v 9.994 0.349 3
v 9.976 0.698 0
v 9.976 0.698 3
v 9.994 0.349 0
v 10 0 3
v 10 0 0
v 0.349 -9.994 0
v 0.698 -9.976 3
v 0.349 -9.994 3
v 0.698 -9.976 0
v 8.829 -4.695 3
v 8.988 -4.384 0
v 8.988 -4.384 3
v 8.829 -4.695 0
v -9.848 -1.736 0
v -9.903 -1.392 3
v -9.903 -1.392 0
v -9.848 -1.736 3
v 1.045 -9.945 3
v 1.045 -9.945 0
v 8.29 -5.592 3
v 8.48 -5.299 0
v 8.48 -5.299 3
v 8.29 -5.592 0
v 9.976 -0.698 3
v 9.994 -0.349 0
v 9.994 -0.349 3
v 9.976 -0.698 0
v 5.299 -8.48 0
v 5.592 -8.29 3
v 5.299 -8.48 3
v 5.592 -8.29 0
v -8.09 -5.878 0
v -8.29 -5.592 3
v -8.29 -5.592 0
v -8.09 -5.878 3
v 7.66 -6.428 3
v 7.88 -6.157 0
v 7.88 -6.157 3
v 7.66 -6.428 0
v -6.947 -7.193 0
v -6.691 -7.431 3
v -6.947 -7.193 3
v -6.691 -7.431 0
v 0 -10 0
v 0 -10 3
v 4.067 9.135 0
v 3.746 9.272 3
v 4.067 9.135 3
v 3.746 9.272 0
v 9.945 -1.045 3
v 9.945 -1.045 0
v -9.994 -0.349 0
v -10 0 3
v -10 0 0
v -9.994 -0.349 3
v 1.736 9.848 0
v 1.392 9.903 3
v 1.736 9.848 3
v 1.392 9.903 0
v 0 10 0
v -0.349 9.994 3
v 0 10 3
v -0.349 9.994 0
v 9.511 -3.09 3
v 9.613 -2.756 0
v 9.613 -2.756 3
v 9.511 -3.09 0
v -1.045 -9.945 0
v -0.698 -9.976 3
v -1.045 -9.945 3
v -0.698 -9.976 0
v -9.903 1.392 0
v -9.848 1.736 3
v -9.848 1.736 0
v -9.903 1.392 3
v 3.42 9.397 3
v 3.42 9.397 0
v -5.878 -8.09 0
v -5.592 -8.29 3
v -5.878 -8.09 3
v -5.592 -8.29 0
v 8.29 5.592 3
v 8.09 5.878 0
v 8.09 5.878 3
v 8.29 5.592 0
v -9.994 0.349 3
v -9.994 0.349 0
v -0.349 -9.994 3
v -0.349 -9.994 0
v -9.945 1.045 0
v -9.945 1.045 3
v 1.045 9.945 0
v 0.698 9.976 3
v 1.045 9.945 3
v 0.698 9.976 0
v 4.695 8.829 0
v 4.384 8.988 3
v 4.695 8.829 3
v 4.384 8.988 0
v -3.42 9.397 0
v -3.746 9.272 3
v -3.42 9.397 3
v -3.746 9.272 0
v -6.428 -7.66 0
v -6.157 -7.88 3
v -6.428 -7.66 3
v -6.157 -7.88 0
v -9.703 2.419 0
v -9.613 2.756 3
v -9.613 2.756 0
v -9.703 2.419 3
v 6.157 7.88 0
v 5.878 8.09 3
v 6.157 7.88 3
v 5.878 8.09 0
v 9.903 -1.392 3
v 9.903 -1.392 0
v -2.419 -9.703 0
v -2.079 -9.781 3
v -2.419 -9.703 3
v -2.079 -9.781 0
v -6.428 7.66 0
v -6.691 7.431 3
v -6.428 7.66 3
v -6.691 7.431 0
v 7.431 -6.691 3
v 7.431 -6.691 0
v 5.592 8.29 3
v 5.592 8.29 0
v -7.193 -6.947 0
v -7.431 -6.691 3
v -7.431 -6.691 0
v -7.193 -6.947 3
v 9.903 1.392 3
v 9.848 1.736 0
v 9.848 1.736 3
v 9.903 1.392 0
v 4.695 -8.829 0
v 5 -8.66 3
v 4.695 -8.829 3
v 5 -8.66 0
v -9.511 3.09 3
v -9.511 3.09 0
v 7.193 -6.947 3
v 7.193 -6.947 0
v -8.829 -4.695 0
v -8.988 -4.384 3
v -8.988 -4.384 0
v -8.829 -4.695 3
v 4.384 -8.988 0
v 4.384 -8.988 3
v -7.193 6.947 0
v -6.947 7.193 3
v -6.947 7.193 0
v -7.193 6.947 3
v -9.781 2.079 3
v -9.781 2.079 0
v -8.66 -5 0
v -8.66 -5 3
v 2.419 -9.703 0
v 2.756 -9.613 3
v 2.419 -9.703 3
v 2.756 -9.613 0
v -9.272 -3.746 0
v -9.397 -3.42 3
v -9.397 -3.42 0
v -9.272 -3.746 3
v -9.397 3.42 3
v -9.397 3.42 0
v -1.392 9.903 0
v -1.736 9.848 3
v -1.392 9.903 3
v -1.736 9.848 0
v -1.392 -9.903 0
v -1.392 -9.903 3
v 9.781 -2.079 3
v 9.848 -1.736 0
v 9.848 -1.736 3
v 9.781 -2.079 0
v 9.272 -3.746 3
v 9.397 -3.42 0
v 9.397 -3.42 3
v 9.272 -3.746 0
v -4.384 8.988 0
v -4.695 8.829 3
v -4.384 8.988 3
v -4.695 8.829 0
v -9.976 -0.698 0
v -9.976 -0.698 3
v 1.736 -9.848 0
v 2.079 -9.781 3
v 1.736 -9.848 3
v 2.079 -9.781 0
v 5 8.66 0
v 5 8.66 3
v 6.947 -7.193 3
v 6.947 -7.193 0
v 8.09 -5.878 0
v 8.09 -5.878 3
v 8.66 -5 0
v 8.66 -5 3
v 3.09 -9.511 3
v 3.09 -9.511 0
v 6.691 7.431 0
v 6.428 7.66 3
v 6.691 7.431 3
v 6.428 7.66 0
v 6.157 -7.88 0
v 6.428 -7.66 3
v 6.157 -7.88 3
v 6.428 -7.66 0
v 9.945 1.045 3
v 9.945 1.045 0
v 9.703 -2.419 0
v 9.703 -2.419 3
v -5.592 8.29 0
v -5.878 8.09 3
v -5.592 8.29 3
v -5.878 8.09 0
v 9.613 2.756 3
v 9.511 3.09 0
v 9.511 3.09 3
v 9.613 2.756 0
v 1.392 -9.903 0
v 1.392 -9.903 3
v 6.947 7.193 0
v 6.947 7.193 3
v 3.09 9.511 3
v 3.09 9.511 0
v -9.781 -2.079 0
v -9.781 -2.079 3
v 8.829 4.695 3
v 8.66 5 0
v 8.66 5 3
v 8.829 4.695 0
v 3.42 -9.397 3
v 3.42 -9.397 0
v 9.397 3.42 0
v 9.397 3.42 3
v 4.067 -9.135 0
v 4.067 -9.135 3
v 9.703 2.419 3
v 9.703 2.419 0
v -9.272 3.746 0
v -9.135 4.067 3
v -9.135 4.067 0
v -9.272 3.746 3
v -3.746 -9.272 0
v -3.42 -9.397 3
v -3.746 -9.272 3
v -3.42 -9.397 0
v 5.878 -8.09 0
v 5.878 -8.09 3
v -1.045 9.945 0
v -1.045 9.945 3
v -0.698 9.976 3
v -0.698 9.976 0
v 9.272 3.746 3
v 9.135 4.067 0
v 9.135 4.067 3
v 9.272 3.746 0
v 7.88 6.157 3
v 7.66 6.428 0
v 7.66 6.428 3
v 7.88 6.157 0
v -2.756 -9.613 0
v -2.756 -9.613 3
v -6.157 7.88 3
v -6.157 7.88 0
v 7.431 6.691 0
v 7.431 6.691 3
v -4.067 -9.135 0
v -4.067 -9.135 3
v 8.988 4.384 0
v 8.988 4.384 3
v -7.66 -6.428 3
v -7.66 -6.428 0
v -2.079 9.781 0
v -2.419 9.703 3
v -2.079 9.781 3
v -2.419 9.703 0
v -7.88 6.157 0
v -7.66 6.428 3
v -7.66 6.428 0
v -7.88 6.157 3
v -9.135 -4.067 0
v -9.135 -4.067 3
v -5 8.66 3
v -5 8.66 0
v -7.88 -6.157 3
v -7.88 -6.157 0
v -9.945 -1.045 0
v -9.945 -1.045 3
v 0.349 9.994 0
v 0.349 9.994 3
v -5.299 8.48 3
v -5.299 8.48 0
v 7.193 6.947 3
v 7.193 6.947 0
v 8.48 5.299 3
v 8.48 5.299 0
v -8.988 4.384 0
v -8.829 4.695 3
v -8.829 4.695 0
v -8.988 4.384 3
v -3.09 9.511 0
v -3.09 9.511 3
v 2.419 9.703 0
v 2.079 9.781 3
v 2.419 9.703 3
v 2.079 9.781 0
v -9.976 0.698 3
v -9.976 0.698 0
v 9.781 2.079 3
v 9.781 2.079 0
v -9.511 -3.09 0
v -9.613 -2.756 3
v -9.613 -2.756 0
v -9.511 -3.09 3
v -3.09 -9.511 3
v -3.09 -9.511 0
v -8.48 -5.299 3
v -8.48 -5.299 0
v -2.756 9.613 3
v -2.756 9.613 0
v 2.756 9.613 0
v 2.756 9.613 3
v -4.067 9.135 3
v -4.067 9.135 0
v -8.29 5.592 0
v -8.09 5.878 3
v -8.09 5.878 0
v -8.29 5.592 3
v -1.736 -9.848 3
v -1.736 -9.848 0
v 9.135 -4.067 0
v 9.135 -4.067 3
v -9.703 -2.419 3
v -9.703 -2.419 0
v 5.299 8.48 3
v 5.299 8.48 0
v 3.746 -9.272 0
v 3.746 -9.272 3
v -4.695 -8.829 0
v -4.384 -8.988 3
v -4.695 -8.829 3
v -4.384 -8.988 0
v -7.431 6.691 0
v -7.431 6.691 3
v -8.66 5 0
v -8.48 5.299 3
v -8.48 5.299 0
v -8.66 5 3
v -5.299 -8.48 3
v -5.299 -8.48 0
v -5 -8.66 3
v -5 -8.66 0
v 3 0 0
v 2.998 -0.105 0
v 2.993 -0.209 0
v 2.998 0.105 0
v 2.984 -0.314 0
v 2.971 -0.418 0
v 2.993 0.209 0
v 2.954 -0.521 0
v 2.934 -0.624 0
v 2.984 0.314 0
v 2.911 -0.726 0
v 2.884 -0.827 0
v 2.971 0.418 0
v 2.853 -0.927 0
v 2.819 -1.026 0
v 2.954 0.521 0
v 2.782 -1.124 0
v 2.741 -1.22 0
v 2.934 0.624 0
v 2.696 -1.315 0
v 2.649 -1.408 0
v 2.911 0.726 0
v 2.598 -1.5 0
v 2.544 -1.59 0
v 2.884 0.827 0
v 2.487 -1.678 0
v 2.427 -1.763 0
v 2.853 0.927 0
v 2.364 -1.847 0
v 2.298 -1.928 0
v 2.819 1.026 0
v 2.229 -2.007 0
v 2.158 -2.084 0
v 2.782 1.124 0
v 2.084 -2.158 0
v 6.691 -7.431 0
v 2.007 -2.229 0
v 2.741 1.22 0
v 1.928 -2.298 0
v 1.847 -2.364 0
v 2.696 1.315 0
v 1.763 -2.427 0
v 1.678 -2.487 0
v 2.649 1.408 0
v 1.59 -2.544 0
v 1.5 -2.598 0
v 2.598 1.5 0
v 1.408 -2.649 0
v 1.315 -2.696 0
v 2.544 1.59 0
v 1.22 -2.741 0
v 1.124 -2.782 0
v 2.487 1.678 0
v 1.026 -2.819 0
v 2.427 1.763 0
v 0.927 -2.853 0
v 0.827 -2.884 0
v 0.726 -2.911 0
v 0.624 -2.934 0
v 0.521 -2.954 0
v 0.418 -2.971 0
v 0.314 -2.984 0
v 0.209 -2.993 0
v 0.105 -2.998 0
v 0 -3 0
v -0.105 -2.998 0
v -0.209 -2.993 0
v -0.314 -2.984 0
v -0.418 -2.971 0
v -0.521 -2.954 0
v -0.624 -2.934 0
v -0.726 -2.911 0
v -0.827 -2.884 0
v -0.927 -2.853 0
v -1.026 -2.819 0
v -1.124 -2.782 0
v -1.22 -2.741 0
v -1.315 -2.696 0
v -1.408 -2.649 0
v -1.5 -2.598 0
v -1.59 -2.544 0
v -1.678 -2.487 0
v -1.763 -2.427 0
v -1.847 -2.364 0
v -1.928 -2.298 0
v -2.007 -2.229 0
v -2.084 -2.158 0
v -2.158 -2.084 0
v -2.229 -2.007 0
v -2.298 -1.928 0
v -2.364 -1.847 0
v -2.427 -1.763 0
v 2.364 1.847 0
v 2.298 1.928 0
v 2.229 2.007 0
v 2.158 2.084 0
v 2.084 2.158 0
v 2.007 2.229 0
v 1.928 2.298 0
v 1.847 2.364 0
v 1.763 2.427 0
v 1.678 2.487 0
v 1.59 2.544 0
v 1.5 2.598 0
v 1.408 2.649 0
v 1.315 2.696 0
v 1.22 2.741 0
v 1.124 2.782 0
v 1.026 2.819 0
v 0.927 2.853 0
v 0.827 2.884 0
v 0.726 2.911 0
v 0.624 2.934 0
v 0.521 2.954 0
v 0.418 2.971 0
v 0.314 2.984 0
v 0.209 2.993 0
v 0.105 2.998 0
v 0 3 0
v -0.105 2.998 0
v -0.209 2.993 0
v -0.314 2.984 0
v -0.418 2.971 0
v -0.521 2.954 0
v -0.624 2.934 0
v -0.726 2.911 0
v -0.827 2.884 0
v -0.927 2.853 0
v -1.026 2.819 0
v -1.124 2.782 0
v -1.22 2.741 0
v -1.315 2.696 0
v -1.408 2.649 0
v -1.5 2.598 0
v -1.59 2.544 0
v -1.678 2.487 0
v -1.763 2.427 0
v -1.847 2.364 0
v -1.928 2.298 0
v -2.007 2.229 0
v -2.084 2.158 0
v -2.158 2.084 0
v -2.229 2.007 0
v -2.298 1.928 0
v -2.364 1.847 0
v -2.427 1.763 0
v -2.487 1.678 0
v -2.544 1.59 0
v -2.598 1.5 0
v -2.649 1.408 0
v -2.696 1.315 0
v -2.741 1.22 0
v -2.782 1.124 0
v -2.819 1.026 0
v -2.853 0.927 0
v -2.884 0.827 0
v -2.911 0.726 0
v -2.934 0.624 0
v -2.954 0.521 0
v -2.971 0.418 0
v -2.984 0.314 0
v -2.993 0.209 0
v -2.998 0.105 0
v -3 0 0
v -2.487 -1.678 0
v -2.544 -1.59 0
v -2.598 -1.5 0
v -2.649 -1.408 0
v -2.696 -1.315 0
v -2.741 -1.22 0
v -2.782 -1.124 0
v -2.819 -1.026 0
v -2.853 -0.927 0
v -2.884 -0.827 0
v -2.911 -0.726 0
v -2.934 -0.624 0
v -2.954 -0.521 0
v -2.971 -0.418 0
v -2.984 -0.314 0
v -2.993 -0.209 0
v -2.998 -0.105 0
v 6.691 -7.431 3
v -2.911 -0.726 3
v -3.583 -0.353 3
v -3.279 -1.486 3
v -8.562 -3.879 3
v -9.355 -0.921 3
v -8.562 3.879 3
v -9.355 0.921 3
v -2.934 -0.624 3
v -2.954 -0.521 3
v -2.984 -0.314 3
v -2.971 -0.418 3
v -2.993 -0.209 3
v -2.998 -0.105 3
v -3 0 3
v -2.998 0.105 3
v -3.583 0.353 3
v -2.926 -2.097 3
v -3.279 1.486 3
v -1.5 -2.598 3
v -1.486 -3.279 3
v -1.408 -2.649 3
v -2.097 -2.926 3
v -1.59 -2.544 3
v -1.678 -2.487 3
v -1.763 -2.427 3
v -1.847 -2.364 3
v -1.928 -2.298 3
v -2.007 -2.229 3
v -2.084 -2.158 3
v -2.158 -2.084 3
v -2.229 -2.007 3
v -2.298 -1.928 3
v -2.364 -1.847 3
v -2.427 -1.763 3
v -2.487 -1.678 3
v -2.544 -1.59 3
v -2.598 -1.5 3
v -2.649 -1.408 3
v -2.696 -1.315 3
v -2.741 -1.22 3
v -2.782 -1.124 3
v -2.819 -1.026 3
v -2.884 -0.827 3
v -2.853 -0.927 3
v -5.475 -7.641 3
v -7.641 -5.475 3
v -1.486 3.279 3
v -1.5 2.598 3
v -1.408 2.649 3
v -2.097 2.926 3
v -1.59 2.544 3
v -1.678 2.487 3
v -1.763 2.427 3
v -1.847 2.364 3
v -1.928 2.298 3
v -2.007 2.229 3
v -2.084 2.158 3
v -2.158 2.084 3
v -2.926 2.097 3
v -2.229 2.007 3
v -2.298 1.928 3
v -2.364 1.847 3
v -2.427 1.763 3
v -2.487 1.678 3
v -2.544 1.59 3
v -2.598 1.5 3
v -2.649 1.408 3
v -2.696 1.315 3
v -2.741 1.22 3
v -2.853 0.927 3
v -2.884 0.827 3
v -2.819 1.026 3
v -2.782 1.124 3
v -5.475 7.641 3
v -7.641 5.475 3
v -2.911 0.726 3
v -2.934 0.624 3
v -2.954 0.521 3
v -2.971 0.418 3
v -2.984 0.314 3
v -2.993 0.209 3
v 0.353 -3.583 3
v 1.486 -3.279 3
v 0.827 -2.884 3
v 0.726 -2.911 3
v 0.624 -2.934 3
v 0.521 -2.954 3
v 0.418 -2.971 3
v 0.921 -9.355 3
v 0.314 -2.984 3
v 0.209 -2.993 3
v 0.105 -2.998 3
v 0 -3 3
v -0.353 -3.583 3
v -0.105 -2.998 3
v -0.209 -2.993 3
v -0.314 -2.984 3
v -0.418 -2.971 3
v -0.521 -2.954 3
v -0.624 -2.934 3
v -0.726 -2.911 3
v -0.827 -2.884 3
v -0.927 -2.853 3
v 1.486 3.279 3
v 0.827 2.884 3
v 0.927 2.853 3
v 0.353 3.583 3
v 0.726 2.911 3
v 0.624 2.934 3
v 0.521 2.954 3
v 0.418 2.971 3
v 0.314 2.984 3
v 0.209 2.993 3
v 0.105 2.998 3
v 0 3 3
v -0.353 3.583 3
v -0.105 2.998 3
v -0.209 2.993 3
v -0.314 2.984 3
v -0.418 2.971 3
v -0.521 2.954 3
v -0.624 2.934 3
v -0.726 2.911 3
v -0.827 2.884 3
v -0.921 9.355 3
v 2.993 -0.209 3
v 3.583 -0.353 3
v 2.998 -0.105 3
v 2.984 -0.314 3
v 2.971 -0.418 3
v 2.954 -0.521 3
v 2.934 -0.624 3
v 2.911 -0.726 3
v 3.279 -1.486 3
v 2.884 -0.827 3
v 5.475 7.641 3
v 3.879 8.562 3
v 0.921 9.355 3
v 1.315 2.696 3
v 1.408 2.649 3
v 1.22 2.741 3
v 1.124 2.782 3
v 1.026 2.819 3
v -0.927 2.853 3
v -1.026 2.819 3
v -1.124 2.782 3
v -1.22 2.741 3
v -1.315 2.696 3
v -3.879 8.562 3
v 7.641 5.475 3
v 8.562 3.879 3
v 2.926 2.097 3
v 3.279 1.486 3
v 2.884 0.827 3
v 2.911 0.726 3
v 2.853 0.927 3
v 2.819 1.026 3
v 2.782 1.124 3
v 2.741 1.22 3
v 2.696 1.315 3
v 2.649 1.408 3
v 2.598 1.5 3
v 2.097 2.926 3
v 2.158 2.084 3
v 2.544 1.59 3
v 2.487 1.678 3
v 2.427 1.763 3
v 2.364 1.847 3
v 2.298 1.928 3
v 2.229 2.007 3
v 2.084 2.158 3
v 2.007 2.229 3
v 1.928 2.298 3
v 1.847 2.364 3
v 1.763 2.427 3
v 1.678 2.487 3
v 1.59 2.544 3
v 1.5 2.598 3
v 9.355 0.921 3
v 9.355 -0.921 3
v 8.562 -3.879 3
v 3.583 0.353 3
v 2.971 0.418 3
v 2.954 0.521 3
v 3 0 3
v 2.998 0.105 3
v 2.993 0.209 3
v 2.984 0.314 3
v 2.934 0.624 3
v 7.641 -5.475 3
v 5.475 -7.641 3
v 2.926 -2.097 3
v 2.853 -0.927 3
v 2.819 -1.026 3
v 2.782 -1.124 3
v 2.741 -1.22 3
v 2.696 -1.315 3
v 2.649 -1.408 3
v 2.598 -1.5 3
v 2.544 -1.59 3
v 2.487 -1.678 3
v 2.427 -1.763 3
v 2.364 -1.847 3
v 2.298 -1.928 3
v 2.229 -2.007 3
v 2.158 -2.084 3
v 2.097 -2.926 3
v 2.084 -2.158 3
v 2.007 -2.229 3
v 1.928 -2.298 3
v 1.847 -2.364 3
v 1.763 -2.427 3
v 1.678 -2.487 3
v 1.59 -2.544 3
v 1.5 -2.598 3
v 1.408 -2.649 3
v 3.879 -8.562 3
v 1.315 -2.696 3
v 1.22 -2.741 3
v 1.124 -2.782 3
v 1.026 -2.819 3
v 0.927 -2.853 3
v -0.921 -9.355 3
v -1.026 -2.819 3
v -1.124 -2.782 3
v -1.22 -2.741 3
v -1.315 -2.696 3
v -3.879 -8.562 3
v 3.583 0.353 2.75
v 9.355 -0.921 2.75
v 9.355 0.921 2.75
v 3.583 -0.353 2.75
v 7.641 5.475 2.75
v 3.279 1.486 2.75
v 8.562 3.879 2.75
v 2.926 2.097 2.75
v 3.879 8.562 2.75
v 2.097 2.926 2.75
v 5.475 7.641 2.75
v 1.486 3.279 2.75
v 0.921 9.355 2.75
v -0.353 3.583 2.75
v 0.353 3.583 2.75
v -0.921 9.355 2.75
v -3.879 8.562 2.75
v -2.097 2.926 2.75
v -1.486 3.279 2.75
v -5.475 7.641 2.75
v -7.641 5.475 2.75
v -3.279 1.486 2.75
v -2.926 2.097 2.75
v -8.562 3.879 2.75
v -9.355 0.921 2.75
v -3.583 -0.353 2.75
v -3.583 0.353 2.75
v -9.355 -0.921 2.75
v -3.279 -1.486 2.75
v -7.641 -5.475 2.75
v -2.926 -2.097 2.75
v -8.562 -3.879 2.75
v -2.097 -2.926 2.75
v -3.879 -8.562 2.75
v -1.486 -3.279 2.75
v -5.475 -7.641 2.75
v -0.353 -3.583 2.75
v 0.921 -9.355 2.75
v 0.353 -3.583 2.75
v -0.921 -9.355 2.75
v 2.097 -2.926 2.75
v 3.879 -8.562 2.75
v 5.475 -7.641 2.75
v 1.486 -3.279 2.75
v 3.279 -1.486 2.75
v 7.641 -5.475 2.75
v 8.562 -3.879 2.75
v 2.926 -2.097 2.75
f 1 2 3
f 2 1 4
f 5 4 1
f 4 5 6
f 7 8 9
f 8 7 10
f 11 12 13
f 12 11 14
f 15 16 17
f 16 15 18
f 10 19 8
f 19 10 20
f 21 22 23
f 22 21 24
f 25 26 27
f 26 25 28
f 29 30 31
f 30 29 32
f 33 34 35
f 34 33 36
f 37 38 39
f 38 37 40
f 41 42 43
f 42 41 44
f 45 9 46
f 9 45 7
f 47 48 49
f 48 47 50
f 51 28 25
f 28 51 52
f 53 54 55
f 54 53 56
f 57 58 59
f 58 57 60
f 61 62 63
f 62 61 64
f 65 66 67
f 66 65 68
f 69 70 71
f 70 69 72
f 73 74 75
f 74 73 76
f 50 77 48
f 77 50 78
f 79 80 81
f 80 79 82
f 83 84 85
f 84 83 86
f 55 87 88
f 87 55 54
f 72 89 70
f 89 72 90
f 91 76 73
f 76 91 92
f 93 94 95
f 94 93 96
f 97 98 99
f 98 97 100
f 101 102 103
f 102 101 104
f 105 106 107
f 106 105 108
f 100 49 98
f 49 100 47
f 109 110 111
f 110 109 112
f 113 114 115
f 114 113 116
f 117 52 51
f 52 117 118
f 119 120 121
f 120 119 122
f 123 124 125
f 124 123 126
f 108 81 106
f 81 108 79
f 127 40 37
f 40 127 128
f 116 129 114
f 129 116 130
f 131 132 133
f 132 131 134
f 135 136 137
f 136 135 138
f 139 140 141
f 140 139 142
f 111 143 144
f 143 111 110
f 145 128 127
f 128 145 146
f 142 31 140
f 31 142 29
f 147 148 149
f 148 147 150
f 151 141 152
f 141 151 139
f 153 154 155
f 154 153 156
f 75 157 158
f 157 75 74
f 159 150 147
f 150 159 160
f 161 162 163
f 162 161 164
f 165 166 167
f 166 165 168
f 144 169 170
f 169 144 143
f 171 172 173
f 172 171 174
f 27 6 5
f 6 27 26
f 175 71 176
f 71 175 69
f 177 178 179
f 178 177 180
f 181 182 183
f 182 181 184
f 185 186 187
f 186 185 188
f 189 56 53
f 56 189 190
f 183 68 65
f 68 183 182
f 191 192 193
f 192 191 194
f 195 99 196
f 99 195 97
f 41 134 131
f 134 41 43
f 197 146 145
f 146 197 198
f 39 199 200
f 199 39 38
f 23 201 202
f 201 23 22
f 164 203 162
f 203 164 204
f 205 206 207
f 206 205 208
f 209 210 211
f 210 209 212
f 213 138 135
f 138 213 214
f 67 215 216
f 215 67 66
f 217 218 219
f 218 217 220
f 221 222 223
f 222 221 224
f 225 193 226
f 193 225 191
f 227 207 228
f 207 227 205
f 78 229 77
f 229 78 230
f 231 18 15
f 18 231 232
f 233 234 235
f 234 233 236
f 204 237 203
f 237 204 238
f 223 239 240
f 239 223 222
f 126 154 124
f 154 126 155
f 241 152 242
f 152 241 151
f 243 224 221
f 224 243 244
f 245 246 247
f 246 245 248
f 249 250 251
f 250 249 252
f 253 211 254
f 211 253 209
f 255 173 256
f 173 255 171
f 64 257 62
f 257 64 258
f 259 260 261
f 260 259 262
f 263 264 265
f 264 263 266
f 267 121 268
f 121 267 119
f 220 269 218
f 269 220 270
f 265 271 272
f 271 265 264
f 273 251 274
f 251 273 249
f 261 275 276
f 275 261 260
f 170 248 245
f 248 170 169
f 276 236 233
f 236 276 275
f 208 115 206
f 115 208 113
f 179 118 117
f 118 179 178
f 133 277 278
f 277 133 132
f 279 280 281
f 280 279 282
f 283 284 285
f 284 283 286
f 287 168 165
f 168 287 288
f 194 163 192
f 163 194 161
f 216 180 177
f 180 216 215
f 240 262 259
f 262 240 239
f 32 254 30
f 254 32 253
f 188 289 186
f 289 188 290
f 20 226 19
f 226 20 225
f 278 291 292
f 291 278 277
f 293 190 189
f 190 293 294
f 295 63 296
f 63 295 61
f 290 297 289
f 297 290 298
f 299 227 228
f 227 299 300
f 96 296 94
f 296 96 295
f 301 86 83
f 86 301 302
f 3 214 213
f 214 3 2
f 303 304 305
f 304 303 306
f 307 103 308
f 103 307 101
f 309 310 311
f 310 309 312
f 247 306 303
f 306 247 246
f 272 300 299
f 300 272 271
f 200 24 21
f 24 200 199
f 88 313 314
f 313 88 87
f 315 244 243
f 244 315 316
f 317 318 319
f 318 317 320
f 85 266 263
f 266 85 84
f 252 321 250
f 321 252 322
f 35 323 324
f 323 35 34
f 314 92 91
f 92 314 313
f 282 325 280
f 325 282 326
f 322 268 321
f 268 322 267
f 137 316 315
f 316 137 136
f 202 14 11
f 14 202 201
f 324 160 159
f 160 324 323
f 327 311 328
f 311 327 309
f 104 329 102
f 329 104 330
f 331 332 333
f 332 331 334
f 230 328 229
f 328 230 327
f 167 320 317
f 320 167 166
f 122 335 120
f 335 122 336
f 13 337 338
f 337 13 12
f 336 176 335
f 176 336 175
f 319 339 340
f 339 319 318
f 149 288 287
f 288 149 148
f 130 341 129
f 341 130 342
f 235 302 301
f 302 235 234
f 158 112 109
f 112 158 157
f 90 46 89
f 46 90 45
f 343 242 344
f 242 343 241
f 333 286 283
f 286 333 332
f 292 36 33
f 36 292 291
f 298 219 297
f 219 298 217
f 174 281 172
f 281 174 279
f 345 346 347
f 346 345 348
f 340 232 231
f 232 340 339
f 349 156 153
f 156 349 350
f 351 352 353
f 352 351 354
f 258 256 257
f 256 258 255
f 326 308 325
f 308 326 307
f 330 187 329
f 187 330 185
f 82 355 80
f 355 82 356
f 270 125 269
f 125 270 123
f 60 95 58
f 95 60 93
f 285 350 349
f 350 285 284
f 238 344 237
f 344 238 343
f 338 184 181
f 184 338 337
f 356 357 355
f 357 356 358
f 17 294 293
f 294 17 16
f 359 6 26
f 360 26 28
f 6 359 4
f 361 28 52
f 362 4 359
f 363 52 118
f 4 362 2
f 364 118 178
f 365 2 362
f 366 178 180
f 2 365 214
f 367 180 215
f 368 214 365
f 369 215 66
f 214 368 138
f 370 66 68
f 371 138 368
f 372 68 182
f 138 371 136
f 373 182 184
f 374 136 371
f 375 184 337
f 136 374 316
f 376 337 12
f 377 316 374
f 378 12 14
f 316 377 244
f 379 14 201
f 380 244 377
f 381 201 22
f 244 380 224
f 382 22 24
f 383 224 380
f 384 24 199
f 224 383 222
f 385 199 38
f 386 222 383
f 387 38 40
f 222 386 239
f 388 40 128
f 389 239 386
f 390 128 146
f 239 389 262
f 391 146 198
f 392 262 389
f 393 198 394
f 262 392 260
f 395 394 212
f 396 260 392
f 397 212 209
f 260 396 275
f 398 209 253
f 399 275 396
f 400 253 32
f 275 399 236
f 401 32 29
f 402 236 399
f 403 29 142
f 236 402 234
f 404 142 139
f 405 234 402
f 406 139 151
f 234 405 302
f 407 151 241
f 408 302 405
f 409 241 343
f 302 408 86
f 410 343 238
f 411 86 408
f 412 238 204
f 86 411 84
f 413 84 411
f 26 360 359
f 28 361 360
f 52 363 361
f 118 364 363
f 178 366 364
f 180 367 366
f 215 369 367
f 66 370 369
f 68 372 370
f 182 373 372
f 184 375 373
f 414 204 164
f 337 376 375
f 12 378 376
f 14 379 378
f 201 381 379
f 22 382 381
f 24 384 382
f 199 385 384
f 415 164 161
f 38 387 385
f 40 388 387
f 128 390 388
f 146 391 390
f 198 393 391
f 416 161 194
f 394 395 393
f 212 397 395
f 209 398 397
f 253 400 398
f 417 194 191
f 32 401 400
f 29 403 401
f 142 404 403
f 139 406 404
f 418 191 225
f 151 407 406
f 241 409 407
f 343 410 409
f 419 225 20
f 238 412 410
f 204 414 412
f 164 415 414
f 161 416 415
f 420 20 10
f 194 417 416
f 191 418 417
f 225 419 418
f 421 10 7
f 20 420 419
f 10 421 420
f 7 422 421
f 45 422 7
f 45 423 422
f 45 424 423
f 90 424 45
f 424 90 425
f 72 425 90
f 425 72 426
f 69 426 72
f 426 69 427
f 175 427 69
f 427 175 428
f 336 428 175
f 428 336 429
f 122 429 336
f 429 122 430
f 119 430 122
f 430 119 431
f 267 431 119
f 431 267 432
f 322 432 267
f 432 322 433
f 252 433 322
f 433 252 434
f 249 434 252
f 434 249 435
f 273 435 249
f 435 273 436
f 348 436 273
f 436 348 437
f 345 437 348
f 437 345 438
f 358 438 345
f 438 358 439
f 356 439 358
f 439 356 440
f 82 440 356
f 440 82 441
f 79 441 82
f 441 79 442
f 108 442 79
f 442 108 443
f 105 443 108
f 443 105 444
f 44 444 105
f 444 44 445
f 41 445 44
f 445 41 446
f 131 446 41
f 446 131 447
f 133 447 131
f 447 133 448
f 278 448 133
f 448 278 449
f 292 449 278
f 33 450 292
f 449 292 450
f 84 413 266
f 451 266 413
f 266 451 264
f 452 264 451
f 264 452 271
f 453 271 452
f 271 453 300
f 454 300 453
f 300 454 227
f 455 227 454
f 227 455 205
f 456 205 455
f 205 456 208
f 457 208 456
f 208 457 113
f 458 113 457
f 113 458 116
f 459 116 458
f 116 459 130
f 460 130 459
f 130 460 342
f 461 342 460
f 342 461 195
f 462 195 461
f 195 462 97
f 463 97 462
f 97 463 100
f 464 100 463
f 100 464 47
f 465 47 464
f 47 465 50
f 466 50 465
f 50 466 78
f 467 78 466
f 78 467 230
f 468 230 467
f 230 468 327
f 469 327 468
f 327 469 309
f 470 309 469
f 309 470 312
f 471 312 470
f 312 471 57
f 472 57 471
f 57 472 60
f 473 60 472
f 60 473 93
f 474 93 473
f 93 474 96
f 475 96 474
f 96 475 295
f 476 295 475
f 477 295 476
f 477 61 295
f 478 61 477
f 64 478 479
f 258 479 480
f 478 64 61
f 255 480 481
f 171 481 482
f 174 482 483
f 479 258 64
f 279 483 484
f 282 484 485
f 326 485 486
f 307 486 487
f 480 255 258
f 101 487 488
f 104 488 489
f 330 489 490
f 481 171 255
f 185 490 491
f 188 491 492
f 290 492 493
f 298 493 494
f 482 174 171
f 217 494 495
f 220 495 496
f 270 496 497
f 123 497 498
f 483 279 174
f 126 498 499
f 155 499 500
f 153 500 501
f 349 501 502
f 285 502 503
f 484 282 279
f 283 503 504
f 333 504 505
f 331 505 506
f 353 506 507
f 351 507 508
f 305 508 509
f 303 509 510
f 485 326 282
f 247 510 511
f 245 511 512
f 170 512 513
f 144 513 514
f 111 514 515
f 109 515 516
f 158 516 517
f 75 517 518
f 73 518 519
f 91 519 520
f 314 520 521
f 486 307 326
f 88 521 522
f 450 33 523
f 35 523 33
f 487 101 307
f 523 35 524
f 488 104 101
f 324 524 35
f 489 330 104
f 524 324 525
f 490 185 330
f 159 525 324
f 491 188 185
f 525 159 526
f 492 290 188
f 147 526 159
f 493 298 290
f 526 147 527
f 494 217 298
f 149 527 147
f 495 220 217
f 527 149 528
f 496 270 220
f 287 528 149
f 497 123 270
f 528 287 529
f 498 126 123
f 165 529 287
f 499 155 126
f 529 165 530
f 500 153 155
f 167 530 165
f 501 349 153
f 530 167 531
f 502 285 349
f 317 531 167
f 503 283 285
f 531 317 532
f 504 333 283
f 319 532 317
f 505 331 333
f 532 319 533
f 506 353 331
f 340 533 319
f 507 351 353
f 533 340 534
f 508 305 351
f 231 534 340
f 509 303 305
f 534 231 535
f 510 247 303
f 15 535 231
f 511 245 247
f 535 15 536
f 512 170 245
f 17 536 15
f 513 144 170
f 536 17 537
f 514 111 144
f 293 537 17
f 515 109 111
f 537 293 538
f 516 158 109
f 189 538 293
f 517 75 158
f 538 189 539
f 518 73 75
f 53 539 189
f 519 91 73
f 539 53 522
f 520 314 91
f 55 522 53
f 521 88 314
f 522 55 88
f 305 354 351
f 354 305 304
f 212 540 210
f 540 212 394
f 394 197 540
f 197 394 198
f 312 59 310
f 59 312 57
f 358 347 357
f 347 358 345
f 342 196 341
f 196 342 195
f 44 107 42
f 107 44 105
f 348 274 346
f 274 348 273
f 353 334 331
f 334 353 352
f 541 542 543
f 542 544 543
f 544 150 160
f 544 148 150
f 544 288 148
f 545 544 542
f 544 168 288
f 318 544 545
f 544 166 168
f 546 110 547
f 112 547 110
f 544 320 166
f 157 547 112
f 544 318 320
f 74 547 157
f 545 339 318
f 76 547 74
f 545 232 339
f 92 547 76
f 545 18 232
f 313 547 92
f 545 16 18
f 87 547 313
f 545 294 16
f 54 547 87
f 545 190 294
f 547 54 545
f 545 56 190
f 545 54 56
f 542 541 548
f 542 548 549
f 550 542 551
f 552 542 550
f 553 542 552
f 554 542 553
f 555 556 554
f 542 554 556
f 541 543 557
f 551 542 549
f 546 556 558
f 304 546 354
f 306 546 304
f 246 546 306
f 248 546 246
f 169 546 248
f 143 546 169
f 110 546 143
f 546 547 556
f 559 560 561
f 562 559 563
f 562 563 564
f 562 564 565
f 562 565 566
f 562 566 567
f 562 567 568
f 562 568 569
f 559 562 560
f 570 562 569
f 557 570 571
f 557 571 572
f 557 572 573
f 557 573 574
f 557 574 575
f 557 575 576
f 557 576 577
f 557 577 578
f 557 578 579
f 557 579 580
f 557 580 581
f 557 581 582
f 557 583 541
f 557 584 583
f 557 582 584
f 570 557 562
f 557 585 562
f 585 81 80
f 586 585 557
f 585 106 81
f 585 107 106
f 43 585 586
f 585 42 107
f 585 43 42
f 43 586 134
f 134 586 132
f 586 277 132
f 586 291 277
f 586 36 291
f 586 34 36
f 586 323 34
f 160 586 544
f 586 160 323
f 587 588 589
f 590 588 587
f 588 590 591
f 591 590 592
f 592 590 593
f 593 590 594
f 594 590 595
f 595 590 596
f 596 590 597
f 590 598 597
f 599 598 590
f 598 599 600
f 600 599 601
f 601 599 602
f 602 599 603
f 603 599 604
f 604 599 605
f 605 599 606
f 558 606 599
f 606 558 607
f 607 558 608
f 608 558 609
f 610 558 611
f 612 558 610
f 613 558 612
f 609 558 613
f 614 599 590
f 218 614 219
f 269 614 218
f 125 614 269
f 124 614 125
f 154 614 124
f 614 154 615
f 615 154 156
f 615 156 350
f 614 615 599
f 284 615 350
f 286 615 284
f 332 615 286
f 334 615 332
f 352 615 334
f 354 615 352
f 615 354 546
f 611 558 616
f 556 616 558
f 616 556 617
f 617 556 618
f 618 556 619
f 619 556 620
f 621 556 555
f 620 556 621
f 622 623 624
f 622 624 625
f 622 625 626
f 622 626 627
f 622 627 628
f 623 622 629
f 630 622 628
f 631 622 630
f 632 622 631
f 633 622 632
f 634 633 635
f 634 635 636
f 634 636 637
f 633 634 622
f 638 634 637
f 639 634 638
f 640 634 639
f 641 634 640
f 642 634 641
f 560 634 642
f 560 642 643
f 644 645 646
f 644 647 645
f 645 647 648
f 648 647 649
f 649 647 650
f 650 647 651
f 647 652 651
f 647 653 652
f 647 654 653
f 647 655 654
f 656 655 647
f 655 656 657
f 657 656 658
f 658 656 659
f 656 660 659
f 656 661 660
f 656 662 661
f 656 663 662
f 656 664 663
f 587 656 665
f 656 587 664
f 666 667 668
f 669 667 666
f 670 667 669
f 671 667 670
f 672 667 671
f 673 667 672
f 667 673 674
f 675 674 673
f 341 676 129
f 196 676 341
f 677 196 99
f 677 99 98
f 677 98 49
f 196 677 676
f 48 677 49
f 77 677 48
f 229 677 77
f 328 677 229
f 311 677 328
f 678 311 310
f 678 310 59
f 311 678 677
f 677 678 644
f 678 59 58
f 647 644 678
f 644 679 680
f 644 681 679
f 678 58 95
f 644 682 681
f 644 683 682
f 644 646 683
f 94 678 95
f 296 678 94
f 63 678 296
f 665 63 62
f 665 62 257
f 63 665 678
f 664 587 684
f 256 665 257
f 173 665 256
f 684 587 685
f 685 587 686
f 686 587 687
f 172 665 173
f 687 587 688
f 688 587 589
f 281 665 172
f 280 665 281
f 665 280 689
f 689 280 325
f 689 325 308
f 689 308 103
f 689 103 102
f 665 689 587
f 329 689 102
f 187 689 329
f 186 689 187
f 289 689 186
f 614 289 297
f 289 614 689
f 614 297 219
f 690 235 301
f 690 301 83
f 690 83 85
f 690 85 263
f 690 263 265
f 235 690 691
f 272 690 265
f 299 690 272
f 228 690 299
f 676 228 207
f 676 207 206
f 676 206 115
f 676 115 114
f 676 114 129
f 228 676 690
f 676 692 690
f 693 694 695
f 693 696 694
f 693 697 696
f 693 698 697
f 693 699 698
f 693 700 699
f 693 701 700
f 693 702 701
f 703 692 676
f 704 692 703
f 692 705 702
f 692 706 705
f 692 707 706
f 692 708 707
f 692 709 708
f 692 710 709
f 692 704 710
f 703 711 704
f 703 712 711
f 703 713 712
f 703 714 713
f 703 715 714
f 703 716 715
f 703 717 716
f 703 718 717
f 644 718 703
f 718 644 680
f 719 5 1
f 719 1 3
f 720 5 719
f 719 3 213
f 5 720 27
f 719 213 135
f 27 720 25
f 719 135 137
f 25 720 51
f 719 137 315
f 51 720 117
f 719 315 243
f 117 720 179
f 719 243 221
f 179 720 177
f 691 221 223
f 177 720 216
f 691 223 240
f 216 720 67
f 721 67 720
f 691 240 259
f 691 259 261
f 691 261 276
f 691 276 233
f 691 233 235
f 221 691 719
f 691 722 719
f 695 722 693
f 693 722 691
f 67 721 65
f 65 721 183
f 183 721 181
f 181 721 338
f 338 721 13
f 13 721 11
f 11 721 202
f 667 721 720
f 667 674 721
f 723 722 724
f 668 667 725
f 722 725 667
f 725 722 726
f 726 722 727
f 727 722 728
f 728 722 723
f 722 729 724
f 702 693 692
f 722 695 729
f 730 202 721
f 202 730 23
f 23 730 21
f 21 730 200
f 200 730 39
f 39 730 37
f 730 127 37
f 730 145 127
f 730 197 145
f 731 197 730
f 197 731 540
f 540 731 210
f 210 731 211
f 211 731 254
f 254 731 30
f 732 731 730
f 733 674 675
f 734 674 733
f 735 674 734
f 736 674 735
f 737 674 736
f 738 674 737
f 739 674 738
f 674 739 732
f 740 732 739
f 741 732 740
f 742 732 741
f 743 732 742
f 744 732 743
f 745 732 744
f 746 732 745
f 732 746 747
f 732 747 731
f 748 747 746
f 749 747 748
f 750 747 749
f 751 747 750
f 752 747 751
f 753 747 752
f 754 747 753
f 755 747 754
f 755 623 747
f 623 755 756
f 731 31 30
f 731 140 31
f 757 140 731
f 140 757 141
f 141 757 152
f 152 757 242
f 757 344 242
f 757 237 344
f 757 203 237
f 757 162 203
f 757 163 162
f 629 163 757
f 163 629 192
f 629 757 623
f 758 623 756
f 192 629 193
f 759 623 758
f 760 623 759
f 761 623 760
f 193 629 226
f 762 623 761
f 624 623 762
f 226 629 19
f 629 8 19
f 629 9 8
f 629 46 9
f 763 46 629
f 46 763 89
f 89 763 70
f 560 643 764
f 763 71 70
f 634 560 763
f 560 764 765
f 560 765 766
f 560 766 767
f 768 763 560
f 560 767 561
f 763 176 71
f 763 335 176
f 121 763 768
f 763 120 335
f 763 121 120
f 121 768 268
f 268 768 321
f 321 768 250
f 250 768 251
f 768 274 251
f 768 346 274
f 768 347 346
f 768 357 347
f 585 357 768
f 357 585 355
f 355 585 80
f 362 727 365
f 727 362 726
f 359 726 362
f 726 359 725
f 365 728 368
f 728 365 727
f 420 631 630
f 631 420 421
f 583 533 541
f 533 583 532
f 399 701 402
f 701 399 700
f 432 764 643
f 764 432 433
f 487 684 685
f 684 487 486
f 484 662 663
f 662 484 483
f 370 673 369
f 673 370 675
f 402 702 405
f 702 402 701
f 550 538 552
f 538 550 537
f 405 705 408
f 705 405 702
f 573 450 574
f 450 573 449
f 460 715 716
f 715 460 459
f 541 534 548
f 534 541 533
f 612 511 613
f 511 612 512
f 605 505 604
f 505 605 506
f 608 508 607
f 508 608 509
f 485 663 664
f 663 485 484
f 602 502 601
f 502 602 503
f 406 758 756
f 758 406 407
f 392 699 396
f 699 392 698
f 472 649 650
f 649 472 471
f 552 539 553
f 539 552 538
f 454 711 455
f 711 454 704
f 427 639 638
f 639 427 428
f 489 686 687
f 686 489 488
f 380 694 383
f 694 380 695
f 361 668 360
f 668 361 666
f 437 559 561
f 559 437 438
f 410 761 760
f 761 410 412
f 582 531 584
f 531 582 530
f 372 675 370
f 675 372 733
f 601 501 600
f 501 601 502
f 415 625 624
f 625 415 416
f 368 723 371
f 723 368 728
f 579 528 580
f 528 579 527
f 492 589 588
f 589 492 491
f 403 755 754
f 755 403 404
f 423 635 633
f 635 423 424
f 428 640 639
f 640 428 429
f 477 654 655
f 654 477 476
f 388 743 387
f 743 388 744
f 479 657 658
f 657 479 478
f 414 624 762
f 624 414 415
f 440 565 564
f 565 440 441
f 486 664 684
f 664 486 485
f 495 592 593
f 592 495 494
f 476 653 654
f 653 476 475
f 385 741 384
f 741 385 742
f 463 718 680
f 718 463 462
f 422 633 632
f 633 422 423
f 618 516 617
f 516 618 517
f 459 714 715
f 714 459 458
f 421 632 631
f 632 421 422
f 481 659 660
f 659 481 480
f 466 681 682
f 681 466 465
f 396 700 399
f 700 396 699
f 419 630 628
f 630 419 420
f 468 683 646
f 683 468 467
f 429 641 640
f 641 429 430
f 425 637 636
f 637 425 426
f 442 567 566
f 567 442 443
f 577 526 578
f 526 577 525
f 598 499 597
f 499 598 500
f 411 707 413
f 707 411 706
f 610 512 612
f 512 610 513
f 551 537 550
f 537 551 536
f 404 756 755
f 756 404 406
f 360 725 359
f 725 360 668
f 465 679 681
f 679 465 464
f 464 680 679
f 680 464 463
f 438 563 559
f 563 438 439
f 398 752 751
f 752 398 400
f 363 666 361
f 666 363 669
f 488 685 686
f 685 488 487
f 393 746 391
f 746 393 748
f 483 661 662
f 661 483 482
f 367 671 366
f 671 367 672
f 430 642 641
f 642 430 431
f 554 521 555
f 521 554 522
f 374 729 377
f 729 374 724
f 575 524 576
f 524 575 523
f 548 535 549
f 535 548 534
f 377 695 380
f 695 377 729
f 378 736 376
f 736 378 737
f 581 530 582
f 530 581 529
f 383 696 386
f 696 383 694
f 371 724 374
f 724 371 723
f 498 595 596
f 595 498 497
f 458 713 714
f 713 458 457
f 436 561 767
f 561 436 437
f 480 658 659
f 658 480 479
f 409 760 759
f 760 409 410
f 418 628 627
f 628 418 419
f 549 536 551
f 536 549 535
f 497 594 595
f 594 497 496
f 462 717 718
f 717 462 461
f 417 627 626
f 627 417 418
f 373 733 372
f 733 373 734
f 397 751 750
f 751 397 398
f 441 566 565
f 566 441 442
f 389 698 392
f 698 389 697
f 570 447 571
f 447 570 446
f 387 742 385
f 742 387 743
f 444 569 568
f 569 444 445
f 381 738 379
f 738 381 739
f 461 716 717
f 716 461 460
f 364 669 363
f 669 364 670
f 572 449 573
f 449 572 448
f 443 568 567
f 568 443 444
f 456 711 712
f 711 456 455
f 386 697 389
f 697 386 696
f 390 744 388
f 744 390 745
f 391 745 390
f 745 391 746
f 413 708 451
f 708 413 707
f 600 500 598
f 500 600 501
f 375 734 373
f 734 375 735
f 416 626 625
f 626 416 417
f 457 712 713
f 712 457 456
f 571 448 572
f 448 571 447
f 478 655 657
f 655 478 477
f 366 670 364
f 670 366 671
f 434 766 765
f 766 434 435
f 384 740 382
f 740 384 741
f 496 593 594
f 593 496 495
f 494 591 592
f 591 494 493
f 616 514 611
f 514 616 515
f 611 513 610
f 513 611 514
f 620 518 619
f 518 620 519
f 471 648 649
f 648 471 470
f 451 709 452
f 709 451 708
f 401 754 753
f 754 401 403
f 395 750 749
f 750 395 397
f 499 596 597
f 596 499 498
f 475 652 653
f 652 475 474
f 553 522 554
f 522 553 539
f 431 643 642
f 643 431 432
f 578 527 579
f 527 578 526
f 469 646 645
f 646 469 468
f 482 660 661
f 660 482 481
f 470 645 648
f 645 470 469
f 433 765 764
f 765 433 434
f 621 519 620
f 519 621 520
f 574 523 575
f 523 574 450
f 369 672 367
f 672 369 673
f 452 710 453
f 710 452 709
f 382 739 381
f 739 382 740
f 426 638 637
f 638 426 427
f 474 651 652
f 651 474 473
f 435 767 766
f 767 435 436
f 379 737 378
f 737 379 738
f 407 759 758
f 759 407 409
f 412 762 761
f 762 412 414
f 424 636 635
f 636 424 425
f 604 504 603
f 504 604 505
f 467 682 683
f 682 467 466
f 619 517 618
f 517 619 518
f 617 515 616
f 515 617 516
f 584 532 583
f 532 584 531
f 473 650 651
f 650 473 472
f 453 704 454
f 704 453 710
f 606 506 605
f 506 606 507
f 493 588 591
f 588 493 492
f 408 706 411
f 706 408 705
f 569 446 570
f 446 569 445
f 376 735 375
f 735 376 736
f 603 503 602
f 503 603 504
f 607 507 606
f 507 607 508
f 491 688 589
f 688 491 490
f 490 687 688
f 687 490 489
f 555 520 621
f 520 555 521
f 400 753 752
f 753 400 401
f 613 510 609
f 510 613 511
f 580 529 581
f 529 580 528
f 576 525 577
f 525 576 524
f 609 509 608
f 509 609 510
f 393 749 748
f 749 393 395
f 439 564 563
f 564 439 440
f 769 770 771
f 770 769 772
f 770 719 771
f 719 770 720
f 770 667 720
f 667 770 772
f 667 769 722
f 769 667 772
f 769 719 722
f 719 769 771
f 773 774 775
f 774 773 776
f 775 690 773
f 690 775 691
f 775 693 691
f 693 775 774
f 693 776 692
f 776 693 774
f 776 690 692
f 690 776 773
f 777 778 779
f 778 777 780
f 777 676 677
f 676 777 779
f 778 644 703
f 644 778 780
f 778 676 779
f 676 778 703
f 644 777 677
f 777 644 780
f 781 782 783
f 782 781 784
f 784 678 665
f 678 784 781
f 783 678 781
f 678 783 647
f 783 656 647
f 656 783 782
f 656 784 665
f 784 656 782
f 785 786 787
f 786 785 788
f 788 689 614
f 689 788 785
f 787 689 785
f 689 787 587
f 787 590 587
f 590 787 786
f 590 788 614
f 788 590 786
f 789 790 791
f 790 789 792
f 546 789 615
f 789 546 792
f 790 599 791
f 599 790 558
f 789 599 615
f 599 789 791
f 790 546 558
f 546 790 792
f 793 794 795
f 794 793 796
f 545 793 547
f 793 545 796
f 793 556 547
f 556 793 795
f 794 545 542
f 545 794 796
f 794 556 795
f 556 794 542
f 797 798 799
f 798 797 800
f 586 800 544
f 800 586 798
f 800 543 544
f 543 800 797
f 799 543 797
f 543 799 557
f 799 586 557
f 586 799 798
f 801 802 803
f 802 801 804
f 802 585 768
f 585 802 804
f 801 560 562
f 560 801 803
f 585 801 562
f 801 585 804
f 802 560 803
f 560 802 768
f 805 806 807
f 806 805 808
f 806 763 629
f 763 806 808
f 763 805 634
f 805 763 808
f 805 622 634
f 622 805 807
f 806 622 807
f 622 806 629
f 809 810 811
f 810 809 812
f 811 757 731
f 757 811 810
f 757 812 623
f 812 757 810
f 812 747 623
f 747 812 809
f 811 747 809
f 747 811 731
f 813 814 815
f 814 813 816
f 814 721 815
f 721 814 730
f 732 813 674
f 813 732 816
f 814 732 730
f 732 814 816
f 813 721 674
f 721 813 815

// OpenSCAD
$fn=180;

// Radial encoder magnet (ring magnet with alternating N/S poles around the circumference)
// Geometry only; polarity pattern is represented as shallow alternating grooves on the top face.

outer_d = 20;          // mm
inner_d = 6;           // mm (shaft hole)
thickness = 3;         // mm

// Visual pole-marking pattern (shallow grooves)
pole_count = 12;       // number of alternating poles around the ring
mark_depth = 0.25;     // mm
mark_width_deg = 360/(pole_count*2) * 0.75; // groove angular width (fraction of half-pole)
mark_r1 = inner_d/2 + 0.6;                  // start radius of marking
mark_r2 = outer_d/2 - 0.6;                  // end radius of marking

module ring_magnet(od, id, h) {
    difference() {
        cylinder(d=od, h=h);
        translate([0,0,-0.1]) cylinder(d=id, h=h+0.2);
    }
}

module groove_sector(r1, r2, ang_deg, h) {
    // Creates a wedge-shaped sector (in XY) extruded in Z
    linear_extrude(height=h)
        polygon(points=[
            [0,0],
            [r2*cos(-ang_deg/2), r2*sin(-ang_deg/2)],
            [r2*cos( ang_deg/2), r2*sin( ang_deg/2)],
            [r1*cos( ang_deg/2), r1*sin( ang_deg/2)],
            [r1*cos(-ang_deg/2), r1*sin(-ang_deg/2)]
        ]);
}

module pole_marks(poles, r1, r2, width_deg, depth, z_top) {
    // Alternate grooves every other half-pole to indicate N/S pattern
    half_step = 360/(poles*2);
    for (i = [0 : poles*2 - 1]) {
        if (i % 2 == 0) {
            rotate([0,0,i*half_step])
                translate([0,0,z_top - depth])
                    groove_sector(r1, r2, width_deg, depth + 0.02);
        }
    }
}

difference() {
    ring_magnet(outer_d, inner_d, thickness);
    pole_marks(pole_count, mark_r1, mark_r2, mark_width_deg, mark_depth, thickness);
}
